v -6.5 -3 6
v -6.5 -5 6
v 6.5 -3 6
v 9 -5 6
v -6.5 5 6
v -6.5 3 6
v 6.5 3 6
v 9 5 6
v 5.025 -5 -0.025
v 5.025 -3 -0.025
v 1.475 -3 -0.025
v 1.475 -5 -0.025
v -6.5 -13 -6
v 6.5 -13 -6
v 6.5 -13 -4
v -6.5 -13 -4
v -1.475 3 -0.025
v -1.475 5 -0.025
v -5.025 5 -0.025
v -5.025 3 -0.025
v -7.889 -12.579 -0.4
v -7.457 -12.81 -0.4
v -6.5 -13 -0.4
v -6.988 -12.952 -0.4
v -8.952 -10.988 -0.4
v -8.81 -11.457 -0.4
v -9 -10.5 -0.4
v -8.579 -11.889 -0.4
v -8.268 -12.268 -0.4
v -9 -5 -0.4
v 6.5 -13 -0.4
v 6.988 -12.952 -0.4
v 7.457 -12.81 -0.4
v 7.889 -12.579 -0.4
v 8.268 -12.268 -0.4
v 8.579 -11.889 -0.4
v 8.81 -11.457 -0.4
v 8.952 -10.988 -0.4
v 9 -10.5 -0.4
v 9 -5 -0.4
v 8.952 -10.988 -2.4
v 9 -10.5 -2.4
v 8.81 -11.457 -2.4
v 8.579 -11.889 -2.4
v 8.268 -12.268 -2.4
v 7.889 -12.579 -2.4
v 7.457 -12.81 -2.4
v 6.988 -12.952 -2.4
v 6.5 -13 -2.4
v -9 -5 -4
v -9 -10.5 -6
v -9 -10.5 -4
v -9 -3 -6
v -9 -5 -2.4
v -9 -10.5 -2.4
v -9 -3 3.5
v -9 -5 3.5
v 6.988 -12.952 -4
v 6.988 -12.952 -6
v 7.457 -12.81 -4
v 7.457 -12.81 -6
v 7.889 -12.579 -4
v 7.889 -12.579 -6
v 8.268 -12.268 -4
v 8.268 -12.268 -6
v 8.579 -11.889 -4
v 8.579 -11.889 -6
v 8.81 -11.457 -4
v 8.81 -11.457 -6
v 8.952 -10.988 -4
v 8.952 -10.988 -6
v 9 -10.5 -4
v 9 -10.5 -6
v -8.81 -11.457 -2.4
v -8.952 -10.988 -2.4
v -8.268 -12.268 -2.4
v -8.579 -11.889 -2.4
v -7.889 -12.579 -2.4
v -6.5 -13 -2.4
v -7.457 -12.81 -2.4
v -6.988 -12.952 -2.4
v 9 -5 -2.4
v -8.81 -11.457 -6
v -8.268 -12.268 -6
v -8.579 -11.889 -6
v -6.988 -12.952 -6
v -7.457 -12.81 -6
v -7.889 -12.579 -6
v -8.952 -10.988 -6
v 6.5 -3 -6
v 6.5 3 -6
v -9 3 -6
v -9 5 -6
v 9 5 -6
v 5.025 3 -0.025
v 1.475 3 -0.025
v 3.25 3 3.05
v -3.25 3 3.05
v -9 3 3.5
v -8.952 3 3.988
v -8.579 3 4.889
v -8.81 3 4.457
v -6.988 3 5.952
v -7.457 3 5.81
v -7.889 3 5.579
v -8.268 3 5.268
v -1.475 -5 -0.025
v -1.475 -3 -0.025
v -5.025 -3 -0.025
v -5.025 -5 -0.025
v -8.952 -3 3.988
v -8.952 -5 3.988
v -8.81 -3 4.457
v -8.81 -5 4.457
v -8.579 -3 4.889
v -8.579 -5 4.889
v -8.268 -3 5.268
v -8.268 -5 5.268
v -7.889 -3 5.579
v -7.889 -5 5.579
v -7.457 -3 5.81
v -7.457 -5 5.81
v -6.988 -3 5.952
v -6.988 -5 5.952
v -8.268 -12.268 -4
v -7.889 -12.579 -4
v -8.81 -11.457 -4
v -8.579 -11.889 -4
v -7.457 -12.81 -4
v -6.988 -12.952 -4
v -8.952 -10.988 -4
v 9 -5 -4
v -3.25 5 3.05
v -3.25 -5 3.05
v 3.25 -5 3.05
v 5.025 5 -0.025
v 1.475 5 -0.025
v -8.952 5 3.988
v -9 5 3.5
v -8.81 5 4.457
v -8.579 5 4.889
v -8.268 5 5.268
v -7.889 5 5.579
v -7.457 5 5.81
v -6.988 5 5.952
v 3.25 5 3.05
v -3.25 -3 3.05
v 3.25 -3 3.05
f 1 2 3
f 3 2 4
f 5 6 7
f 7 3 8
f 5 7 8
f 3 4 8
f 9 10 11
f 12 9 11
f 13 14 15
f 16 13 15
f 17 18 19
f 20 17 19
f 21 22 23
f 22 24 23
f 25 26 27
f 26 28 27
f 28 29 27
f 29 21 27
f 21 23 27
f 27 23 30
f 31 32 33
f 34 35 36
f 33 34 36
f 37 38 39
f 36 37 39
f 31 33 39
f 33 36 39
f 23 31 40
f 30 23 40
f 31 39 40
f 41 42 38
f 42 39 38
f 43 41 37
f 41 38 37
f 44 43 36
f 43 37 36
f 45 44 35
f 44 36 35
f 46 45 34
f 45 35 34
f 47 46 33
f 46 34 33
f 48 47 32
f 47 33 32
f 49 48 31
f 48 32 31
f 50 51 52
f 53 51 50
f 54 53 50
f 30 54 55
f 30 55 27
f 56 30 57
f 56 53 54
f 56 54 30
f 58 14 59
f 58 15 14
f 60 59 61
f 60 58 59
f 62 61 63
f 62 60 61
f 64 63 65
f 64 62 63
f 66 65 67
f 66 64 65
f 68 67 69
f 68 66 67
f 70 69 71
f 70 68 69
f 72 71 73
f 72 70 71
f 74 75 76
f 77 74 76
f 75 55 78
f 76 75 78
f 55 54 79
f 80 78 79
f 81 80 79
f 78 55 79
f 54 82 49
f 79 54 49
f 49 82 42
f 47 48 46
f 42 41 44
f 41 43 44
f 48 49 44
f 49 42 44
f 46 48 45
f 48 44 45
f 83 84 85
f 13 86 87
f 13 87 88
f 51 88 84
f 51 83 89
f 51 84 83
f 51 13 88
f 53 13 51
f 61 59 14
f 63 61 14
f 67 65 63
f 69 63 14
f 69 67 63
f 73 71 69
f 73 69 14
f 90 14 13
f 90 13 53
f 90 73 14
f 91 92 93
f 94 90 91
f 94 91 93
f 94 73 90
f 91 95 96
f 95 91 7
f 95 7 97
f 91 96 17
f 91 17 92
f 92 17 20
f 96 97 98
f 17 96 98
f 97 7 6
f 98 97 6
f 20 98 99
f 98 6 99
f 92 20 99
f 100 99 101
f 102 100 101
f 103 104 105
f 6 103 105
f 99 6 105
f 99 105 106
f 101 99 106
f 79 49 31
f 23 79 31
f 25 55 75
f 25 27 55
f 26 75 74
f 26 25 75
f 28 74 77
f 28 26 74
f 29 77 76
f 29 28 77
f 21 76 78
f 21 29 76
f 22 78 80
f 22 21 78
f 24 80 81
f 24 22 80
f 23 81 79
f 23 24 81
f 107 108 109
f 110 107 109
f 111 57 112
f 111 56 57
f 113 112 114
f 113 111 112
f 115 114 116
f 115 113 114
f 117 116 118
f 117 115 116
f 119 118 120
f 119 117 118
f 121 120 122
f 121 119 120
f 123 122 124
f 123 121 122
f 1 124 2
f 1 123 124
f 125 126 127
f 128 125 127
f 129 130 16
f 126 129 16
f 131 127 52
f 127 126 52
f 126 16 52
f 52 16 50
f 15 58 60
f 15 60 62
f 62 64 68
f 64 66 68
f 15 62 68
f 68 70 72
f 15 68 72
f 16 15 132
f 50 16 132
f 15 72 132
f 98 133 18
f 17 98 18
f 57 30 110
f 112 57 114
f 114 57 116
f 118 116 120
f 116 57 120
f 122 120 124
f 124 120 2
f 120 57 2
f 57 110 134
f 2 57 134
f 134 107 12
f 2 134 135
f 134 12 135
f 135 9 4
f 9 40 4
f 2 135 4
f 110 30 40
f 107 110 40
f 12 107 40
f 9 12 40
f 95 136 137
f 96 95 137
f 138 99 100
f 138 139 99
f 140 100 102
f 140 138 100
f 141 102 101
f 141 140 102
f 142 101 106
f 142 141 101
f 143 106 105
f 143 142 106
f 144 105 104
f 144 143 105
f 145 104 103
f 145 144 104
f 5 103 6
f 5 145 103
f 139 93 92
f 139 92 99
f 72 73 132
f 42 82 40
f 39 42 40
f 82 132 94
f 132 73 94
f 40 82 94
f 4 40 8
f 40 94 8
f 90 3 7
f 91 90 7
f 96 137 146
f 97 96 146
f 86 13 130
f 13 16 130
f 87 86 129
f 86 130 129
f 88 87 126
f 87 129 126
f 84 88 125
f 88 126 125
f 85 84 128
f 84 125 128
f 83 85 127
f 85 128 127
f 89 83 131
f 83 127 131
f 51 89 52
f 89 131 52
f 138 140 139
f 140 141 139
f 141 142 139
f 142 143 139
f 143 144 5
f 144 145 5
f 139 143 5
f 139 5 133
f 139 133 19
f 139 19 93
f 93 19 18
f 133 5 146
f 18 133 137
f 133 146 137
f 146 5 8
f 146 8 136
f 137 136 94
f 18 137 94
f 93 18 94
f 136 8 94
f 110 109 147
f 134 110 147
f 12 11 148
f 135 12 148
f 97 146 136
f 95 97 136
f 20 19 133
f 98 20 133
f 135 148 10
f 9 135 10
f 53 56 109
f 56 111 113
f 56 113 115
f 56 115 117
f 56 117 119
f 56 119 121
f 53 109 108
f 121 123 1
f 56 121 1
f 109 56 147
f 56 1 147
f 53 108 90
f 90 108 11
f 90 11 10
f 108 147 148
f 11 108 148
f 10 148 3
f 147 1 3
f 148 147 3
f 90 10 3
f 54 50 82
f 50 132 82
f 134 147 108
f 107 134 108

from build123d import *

# Parameters (mm, degrees)
BOSS_EXTRUDE1_DEPTH = 9
CUT_EXTRUDE1_DEPTH  = 13
CUT_EXTRUDE2_DEPTH  = 19
FILLET1_R           = 2.5


with BuildPart() as part:
    # Sketch1 → Boss-Extrude1 (new body, symmetric)
    with BuildSketch(Plane(origin=(0, 0, 0), x_dir=(0, 0, -1), z_dir=(1, 0, 0))):
        Polygon((6, -5), (6, -13), (4, -13), (4, -5), (2.4, -5), (2.4, -13), (0.4, -13), (0.4, -5), (-6, -5), (-6, 5), (6, 5), align=None)
    extrude(amount=BOSS_EXTRUDE1_DEPTH, both=True)

    # Sketch2 → Cut-Extrude1 (cut, through all)
    with BuildSketch(Plane.XY.offset(6)):
        Polygon((-6.5, 3), (-9, 3), (-9, -3), (-6.5, -3), (6.5, -3), (6.5, 3), align=None)
    extrude(amount=-CUT_EXTRUDE1_DEPTH, mode=Mode.SUBTRACT)

    # Sketch4 → Cut-Extrude2 (cut, through all)
    with BuildSketch(Plane(origin=(0, 5, 0), x_dir=(1, 0, 0), z_dir=(0, 1, 0))):
        Polygon((3.25, -3.05), (5.025352078, 0.025), (1.474647922, 0.025), align=None)
        Polygon((-1.474647922, 0.025), (-5.025352078, 0.025), (-3.25, -3.05), align=None)
    extrude(amount=-CUT_EXTRUDE2_DEPTH, mode=Mode.SUBTRACT)

    # Fillet1
    fillet1_edges = [part.edges().sort_by_distance(p)[0] for p in [
        (-9, -13, -5),
        (-9, -13, -1.4),
        (-9, 4, 6),
        (9, -13, -1.4),
        (9, -13, -5),
        (-9, -4, 6),
    ]]
    fillet(fillet1_edges, radius=FILLET1_R)


solid = part.part
